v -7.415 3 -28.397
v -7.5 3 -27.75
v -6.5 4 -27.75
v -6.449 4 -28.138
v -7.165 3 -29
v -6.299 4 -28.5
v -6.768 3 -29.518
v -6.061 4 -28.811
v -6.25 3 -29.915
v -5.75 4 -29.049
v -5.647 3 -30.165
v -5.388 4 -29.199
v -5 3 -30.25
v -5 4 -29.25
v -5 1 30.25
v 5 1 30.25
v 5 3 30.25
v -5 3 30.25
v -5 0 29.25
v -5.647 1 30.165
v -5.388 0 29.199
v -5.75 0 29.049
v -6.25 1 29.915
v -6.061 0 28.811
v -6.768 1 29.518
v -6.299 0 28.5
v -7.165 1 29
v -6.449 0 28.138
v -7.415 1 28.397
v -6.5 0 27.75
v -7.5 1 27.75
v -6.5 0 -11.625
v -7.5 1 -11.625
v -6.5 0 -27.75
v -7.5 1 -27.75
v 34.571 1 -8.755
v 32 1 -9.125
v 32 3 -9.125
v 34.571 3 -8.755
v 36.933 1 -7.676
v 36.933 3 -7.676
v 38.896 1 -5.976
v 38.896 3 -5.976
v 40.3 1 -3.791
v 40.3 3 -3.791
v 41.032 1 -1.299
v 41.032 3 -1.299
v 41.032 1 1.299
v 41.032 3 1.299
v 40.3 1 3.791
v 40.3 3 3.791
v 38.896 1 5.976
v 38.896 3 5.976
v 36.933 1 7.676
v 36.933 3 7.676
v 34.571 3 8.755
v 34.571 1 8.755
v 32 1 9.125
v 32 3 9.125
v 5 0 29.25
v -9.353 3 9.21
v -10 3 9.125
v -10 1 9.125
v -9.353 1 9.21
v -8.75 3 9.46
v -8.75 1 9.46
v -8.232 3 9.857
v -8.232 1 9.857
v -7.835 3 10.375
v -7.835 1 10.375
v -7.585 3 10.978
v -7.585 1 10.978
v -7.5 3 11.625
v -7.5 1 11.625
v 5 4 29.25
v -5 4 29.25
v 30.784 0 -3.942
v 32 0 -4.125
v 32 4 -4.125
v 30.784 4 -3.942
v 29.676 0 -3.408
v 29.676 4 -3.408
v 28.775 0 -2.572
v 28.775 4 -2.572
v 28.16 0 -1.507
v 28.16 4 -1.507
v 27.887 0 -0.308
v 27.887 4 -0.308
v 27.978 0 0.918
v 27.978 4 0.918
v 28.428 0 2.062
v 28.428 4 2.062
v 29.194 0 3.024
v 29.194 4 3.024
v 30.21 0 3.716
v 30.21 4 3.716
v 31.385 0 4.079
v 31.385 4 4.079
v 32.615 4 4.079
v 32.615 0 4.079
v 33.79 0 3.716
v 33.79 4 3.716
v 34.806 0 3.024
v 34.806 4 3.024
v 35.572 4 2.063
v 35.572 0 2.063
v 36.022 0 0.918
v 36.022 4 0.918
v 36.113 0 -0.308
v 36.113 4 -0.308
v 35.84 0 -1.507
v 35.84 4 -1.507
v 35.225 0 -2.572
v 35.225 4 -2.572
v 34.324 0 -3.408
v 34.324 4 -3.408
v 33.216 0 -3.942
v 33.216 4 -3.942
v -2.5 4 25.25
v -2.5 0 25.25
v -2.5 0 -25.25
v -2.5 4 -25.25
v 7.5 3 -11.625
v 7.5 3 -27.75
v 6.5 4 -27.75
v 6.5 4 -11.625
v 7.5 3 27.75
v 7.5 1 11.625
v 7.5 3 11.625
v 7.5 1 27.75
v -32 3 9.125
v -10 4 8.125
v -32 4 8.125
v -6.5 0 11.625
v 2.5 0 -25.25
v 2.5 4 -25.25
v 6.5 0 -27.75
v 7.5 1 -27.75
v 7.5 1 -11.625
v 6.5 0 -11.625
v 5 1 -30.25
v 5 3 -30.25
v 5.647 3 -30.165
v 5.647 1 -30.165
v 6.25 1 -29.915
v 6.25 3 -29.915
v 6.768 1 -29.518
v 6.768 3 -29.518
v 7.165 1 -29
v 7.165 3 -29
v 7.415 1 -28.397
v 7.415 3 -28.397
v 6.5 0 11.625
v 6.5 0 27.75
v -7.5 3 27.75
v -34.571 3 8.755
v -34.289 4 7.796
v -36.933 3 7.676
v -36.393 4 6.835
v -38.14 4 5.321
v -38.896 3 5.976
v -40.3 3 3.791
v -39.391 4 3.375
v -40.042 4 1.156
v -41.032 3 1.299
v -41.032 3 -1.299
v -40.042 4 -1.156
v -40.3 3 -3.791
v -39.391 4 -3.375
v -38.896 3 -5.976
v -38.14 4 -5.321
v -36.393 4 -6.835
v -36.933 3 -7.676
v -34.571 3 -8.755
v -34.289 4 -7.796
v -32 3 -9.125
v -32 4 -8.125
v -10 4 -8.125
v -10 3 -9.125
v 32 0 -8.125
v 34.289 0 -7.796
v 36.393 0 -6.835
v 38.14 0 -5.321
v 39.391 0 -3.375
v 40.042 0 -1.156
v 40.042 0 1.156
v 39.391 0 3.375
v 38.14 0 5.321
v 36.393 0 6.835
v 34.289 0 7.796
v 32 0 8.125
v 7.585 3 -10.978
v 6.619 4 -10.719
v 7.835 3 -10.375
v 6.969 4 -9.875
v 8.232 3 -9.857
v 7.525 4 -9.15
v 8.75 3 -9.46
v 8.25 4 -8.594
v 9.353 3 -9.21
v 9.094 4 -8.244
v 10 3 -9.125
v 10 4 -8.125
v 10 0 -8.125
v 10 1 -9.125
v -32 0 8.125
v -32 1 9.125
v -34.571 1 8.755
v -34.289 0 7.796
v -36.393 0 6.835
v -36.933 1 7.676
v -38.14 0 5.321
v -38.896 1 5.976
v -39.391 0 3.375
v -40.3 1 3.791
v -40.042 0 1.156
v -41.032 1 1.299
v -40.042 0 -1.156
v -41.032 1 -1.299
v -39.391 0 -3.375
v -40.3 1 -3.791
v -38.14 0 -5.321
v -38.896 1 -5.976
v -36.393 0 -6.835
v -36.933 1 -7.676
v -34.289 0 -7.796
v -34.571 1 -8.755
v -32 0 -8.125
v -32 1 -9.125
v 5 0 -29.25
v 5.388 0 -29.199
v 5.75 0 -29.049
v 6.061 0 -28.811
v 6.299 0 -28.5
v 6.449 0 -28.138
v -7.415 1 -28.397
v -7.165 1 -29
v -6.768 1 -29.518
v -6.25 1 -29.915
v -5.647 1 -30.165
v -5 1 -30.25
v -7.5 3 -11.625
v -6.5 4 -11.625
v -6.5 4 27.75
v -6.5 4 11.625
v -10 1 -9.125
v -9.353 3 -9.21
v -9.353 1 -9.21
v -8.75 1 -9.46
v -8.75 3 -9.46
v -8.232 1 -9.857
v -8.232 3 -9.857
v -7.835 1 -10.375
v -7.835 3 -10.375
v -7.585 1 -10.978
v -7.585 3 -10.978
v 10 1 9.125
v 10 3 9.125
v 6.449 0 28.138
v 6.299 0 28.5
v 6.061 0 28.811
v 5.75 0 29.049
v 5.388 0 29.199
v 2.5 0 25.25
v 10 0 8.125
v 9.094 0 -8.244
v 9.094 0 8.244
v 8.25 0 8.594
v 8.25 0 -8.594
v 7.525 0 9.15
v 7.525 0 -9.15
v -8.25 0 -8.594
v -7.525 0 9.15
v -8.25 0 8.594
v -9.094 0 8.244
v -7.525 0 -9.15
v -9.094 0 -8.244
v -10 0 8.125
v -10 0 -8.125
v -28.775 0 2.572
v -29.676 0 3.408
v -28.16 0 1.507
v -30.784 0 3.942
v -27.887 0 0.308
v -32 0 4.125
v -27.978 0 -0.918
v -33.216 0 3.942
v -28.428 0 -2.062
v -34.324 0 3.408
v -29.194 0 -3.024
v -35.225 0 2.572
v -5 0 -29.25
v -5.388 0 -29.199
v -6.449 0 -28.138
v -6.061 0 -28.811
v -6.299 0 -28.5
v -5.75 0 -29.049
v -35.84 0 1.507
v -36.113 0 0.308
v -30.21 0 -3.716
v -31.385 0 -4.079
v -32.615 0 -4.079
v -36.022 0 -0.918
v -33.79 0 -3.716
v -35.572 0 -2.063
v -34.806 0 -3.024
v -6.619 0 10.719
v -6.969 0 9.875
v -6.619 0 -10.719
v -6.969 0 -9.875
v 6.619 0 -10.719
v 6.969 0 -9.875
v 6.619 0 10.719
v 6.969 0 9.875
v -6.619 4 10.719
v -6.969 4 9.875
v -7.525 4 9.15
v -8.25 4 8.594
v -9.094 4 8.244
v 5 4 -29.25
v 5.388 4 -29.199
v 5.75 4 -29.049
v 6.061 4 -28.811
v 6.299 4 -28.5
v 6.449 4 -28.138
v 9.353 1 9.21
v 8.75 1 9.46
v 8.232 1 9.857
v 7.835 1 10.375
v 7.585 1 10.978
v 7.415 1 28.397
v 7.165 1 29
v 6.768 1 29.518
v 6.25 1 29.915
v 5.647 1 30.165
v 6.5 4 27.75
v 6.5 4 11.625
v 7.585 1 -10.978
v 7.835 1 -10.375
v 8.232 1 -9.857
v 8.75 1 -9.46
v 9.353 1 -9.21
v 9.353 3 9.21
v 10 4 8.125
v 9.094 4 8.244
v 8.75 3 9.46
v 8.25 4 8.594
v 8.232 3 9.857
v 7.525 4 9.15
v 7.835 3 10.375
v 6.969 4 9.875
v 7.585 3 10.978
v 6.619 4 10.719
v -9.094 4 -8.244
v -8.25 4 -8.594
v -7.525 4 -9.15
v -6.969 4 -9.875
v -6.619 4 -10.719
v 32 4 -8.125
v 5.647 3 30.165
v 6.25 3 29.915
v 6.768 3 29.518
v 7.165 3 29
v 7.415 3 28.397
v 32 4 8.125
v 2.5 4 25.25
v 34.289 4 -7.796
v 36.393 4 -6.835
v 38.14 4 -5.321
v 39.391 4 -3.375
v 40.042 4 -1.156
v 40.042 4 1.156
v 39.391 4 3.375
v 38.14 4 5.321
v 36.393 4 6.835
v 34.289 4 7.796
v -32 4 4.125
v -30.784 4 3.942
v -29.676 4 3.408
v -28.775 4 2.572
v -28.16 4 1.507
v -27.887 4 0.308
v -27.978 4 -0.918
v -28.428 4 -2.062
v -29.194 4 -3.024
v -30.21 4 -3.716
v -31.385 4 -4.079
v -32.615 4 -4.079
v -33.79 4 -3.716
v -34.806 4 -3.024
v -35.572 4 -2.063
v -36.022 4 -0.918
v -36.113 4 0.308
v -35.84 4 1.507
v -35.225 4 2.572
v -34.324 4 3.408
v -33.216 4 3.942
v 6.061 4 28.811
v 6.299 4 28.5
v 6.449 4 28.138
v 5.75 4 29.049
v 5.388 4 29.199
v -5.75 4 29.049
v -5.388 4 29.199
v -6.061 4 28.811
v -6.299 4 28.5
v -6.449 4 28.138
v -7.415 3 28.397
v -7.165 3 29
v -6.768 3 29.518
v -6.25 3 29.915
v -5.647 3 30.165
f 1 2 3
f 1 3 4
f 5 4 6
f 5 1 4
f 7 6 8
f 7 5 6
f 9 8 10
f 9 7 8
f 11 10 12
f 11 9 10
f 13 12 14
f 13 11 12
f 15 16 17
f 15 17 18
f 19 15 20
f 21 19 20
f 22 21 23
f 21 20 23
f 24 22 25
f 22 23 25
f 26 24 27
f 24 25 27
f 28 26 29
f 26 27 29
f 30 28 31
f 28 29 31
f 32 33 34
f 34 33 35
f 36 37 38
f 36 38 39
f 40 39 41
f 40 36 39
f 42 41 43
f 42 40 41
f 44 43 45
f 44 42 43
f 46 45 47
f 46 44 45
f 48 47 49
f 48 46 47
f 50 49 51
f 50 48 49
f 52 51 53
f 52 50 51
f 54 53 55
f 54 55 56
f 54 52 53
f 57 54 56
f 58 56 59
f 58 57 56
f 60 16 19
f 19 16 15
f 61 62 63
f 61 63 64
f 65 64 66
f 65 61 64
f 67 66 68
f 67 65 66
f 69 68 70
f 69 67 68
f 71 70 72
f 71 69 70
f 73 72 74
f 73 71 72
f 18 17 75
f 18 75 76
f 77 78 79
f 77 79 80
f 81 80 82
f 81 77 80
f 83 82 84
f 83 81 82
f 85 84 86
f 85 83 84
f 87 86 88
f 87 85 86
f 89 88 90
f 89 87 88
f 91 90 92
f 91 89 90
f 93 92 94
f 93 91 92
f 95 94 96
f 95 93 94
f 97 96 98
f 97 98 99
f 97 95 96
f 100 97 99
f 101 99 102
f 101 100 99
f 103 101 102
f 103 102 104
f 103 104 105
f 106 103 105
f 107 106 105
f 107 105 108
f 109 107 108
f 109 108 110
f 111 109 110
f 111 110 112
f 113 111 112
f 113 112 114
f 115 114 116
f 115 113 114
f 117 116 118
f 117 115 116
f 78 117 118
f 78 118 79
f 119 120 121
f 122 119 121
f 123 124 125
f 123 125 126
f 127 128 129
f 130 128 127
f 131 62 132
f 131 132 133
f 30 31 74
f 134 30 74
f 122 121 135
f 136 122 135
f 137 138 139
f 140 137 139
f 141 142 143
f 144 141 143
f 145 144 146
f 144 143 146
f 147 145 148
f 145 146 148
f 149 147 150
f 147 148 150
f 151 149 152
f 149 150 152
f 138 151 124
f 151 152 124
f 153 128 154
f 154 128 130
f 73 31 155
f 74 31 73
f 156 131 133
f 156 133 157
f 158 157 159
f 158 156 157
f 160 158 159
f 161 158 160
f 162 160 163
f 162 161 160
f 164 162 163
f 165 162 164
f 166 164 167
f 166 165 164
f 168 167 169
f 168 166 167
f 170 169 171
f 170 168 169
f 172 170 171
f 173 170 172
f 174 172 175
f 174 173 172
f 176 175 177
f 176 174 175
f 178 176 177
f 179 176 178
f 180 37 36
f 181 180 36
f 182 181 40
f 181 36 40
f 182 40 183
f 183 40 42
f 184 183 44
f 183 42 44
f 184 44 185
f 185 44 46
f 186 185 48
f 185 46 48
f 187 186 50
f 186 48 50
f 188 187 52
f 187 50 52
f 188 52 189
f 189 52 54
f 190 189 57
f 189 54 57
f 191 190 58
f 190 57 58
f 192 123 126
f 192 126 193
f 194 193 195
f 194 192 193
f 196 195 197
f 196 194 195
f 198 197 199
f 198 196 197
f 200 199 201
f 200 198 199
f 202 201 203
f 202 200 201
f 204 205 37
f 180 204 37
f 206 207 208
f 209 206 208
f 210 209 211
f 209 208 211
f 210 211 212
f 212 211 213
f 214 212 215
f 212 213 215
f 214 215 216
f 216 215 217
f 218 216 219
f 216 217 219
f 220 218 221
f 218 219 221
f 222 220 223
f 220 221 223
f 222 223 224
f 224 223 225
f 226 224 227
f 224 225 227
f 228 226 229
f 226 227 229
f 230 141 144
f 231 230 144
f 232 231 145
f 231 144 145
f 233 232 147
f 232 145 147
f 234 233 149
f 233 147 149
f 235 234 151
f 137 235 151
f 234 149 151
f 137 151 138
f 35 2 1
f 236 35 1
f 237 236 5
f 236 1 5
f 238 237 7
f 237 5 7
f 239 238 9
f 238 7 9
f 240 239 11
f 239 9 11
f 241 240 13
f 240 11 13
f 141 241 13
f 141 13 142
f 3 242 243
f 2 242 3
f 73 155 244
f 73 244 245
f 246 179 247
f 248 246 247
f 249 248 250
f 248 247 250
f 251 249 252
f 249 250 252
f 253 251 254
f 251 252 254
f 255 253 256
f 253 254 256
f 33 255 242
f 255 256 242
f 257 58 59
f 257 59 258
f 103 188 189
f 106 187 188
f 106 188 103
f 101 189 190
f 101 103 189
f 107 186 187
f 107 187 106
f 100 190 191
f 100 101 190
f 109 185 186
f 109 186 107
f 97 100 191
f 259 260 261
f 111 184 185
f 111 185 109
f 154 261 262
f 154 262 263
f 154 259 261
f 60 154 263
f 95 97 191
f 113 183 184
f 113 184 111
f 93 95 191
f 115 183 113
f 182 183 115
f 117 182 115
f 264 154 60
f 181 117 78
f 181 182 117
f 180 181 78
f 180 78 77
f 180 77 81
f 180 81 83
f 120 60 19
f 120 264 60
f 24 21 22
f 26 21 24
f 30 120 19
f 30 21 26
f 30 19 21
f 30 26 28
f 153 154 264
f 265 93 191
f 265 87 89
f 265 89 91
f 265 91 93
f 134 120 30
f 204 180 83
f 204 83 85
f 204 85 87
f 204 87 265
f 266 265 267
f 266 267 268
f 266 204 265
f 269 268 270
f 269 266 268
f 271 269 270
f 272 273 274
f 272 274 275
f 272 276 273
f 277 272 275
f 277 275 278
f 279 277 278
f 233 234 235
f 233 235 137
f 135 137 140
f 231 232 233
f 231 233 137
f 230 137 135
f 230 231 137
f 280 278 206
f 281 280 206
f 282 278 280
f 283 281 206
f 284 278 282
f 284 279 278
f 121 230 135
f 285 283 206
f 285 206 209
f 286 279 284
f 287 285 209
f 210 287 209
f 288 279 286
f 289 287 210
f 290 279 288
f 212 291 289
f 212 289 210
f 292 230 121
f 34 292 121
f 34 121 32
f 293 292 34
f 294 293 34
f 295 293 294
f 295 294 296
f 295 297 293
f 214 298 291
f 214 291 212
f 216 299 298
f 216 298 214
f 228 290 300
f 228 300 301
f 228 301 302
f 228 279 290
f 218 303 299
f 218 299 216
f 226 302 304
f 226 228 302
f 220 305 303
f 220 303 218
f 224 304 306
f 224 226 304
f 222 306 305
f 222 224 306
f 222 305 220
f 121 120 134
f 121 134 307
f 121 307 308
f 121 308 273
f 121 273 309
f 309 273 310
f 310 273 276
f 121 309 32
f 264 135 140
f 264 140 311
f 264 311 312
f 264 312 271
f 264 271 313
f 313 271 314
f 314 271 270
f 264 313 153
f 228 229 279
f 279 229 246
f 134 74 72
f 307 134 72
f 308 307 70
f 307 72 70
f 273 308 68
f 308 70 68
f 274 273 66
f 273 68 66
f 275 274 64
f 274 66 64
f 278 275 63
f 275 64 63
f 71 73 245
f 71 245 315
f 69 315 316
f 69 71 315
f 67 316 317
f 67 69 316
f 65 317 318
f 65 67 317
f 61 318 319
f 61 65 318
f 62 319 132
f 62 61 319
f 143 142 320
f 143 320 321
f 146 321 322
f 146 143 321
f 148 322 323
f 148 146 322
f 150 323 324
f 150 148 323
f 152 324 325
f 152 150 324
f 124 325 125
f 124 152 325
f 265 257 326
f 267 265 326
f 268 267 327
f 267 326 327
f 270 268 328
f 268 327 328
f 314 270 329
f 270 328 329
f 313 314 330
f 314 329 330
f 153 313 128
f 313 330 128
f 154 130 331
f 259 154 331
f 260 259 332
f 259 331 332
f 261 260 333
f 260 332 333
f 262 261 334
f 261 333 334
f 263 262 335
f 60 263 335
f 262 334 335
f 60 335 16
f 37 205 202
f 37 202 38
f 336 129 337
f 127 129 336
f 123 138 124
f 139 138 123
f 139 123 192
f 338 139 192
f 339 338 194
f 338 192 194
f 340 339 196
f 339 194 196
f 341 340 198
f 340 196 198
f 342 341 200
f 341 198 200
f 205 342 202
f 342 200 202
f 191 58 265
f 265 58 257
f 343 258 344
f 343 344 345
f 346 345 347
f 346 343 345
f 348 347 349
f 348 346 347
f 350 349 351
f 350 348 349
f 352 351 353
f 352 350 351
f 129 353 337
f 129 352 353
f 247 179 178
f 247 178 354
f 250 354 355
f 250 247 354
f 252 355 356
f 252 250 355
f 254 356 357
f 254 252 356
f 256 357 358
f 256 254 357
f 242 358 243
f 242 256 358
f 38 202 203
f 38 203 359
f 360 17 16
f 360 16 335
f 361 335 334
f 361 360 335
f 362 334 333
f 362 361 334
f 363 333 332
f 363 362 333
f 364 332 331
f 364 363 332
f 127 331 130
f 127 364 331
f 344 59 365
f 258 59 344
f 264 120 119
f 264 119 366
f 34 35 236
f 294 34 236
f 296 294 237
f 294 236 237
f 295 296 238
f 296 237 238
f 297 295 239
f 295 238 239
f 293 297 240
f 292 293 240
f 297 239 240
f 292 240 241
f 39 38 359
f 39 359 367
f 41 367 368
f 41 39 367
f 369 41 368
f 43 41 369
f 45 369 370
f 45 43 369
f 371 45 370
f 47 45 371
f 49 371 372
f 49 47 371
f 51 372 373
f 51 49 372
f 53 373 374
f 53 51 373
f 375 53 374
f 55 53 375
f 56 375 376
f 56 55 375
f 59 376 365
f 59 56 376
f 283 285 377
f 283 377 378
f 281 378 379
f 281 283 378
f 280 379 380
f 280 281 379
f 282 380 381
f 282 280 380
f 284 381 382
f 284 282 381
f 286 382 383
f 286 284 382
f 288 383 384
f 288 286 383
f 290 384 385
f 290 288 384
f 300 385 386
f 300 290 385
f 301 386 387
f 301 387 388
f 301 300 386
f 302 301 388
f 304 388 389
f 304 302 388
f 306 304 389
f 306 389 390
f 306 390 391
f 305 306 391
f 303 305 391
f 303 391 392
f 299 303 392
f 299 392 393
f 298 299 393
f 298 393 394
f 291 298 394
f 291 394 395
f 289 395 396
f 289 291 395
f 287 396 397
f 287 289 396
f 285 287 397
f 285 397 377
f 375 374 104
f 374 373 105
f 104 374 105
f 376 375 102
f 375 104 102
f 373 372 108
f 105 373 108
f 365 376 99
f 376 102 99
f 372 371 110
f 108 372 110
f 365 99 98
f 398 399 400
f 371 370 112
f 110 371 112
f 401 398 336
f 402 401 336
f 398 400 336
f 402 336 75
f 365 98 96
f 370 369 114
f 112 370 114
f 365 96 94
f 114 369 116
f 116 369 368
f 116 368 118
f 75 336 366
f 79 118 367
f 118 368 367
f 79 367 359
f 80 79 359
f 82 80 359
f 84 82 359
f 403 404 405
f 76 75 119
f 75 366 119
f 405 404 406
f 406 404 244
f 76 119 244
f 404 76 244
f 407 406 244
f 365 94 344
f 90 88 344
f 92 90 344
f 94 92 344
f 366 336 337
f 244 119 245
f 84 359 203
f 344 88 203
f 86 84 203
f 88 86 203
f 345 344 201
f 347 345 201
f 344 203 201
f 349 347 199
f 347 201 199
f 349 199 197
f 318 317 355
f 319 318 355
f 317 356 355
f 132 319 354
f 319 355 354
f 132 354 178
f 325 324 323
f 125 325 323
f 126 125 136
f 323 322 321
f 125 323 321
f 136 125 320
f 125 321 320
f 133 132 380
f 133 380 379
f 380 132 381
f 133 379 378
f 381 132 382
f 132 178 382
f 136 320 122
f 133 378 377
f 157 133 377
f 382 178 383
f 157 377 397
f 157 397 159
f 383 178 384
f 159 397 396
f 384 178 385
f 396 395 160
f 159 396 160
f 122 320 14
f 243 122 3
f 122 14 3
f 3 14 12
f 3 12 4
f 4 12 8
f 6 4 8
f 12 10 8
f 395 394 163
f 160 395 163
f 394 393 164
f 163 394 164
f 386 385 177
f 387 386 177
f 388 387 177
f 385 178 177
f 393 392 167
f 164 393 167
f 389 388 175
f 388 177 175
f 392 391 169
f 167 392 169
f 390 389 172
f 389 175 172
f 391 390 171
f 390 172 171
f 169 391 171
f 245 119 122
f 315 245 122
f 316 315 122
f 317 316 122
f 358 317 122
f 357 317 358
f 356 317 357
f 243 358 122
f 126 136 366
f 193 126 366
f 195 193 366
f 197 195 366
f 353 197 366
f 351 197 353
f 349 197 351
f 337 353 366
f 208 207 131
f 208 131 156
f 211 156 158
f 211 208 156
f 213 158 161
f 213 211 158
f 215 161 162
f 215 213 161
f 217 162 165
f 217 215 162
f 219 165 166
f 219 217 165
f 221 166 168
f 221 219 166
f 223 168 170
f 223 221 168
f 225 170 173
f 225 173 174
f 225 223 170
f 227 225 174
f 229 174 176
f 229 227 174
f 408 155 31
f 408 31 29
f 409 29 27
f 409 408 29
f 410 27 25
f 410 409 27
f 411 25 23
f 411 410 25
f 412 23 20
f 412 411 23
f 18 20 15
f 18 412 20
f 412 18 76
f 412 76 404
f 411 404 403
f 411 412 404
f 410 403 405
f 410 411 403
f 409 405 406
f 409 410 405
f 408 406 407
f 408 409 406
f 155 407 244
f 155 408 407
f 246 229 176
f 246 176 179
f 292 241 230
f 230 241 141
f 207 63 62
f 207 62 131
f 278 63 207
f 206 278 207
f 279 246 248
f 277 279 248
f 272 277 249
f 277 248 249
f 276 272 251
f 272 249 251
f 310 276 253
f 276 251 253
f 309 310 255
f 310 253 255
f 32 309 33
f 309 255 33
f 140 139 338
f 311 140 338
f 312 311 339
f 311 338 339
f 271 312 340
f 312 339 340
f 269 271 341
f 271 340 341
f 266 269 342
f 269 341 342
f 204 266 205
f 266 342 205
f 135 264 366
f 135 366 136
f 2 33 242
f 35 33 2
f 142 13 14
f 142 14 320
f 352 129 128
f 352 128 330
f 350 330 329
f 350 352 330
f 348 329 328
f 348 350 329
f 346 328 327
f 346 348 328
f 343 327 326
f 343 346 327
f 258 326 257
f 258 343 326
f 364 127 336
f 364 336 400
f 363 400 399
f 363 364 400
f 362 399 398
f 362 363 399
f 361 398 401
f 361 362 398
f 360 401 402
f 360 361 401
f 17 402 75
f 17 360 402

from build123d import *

# Parameters (mm, degrees)
SKETCH1_R           = 4.125
SKETCH1_W           = 5
SKETCH1_H           = 50.5
BOSS_EXTRUDE1_DEPTH = 4
FILLET1_R           = 2.5
CHAMFER1_SIZE       = 1


with BuildPart() as part:
    # Sketch1 → Boss-Extrude1 (new body)
    with BuildSketch(Plane(origin=(0, 0, 0), x_dir=(1, 0, 0), z_dir=(0, 1, 0))):
        with BuildLine():
            Line((-32, 9.125), (-7.5, 9.125))
            Line((-7.5, 9.125), (-7.5, 30.25))
            Line((-7.5, 30.25), (7.5, 30.25))
            Line((7.5, 30.25), (7.5, 9.125))
            Line((7.5, 9.125), (32, 9.125))
            ThreePointArc((32, 9.125), (41.125, 0), (32, -9.125))
            Line((32, -9.125), (7.5, -9.125))
            Line((7.5, -9.125), (7.5, -30.25))
            Line((7.5, -30.25), (-7.5, -30.25))
            Line((-7.5, -30.25), (-7.5, -9.125))
            Line((-7.5, -9.125), (-32, -9.125))
            ThreePointArc((-32, -9.125), (-41.125, 0), (-32, 9.125))
        make_face()
        with Locations(Location((-32, 0, 0), (0, 0, 270))):
            Circle(SKETCH1_R, mode=Mode.SUBTRACT)
        with Locations(Location((32, 0, 0), (0, 0, 90))):
            Circle(SKETCH1_R, mode=Mode.SUBTRACT)
        Rectangle(SKETCH1_W, SKETCH1_H, mode=Mode.SUBTRACT)
    extrude(amount=BOSS_EXTRUDE1_DEPTH)

    # Fillet1
    fillet1_edges = [part.edges().sort_by_distance(p)[0] for p in [
        (-7.5, 2, -9.125),
        (-7.5, 2, -30.25),
        (7.5, 2, -30.25),
        (7.5, 2, -9.125),
        (7.5, 2, 9.125),
        (7.5, 2, 30.25),
        (-7.5, 2, 30.25),
        (-7.5, 2, 9.125),
    ]]
    fillet(fillet1_edges, radius=FILLET1_R)

    # Chamfer1
    chamfer1_edges = [part.edges().sort_by_distance(p)[0] for p in [
        (21, 0, -9.125),
        (41.125, 0, 0),
        (-21, 0, 9.125),
        (-41.125, 0, 0),
        (41.125, 4, 0),
        (21, 4, -9.125),
        (-41.125, 4, 0),
        (-7.5, 0, 19.6875),
        (-7.5, 4, 19.6875),
        (0, 0, 30.25),
        (0, 4, 30.25),
        (-21, 0, -9.125),
        (-7.5, 0, -19.6875),
        (0, 0, -30.25),
        (7.5, 0, -19.6875),
        (21, 0, 9.125),
        (7.5, 0, 19.6875),
        (-6.767766953, 0, -29.517766953),
        (6.767766953, 0, -29.517766953),
        (6.767766953, 0, 29.517766953),
        (-6.767766953, 0, 29.517766953),
        (7.5, 4, 19.6875),
        (21, 4, 9.125),
        (7.5, 4, -19.6875),
        (0, 4, -30.25),
        (-7.5, 4, -19.6875),
        (-21, 4, -9.125),
        (-6.767766953, 4, -29.517766953),
        (6.767766953, 4, -29.517766953),
        (6.767766953, 4, 29.517766953),
        (-6.767766953, 4, 29.517766953),
        (-8.232233047, 0, 9.857233047),
        (-8.232233047, 4, 9.857233047),
        (8.232233047, 0, 9.857233047),
        (8.232233047, 4, 9.857233047),
        (8.232233047, 0, -9.857233047),
        (8.232233047, 4, -9.857233047),
        (-8.232233047, 0, -9.857233047),
        (-8.232233047, 4, -9.857233047),
        (-21, 4, 9.125),
    ]]
    chamfer(chamfer1_edges, length=CHAMFER1_SIZE)


solid = part.part
